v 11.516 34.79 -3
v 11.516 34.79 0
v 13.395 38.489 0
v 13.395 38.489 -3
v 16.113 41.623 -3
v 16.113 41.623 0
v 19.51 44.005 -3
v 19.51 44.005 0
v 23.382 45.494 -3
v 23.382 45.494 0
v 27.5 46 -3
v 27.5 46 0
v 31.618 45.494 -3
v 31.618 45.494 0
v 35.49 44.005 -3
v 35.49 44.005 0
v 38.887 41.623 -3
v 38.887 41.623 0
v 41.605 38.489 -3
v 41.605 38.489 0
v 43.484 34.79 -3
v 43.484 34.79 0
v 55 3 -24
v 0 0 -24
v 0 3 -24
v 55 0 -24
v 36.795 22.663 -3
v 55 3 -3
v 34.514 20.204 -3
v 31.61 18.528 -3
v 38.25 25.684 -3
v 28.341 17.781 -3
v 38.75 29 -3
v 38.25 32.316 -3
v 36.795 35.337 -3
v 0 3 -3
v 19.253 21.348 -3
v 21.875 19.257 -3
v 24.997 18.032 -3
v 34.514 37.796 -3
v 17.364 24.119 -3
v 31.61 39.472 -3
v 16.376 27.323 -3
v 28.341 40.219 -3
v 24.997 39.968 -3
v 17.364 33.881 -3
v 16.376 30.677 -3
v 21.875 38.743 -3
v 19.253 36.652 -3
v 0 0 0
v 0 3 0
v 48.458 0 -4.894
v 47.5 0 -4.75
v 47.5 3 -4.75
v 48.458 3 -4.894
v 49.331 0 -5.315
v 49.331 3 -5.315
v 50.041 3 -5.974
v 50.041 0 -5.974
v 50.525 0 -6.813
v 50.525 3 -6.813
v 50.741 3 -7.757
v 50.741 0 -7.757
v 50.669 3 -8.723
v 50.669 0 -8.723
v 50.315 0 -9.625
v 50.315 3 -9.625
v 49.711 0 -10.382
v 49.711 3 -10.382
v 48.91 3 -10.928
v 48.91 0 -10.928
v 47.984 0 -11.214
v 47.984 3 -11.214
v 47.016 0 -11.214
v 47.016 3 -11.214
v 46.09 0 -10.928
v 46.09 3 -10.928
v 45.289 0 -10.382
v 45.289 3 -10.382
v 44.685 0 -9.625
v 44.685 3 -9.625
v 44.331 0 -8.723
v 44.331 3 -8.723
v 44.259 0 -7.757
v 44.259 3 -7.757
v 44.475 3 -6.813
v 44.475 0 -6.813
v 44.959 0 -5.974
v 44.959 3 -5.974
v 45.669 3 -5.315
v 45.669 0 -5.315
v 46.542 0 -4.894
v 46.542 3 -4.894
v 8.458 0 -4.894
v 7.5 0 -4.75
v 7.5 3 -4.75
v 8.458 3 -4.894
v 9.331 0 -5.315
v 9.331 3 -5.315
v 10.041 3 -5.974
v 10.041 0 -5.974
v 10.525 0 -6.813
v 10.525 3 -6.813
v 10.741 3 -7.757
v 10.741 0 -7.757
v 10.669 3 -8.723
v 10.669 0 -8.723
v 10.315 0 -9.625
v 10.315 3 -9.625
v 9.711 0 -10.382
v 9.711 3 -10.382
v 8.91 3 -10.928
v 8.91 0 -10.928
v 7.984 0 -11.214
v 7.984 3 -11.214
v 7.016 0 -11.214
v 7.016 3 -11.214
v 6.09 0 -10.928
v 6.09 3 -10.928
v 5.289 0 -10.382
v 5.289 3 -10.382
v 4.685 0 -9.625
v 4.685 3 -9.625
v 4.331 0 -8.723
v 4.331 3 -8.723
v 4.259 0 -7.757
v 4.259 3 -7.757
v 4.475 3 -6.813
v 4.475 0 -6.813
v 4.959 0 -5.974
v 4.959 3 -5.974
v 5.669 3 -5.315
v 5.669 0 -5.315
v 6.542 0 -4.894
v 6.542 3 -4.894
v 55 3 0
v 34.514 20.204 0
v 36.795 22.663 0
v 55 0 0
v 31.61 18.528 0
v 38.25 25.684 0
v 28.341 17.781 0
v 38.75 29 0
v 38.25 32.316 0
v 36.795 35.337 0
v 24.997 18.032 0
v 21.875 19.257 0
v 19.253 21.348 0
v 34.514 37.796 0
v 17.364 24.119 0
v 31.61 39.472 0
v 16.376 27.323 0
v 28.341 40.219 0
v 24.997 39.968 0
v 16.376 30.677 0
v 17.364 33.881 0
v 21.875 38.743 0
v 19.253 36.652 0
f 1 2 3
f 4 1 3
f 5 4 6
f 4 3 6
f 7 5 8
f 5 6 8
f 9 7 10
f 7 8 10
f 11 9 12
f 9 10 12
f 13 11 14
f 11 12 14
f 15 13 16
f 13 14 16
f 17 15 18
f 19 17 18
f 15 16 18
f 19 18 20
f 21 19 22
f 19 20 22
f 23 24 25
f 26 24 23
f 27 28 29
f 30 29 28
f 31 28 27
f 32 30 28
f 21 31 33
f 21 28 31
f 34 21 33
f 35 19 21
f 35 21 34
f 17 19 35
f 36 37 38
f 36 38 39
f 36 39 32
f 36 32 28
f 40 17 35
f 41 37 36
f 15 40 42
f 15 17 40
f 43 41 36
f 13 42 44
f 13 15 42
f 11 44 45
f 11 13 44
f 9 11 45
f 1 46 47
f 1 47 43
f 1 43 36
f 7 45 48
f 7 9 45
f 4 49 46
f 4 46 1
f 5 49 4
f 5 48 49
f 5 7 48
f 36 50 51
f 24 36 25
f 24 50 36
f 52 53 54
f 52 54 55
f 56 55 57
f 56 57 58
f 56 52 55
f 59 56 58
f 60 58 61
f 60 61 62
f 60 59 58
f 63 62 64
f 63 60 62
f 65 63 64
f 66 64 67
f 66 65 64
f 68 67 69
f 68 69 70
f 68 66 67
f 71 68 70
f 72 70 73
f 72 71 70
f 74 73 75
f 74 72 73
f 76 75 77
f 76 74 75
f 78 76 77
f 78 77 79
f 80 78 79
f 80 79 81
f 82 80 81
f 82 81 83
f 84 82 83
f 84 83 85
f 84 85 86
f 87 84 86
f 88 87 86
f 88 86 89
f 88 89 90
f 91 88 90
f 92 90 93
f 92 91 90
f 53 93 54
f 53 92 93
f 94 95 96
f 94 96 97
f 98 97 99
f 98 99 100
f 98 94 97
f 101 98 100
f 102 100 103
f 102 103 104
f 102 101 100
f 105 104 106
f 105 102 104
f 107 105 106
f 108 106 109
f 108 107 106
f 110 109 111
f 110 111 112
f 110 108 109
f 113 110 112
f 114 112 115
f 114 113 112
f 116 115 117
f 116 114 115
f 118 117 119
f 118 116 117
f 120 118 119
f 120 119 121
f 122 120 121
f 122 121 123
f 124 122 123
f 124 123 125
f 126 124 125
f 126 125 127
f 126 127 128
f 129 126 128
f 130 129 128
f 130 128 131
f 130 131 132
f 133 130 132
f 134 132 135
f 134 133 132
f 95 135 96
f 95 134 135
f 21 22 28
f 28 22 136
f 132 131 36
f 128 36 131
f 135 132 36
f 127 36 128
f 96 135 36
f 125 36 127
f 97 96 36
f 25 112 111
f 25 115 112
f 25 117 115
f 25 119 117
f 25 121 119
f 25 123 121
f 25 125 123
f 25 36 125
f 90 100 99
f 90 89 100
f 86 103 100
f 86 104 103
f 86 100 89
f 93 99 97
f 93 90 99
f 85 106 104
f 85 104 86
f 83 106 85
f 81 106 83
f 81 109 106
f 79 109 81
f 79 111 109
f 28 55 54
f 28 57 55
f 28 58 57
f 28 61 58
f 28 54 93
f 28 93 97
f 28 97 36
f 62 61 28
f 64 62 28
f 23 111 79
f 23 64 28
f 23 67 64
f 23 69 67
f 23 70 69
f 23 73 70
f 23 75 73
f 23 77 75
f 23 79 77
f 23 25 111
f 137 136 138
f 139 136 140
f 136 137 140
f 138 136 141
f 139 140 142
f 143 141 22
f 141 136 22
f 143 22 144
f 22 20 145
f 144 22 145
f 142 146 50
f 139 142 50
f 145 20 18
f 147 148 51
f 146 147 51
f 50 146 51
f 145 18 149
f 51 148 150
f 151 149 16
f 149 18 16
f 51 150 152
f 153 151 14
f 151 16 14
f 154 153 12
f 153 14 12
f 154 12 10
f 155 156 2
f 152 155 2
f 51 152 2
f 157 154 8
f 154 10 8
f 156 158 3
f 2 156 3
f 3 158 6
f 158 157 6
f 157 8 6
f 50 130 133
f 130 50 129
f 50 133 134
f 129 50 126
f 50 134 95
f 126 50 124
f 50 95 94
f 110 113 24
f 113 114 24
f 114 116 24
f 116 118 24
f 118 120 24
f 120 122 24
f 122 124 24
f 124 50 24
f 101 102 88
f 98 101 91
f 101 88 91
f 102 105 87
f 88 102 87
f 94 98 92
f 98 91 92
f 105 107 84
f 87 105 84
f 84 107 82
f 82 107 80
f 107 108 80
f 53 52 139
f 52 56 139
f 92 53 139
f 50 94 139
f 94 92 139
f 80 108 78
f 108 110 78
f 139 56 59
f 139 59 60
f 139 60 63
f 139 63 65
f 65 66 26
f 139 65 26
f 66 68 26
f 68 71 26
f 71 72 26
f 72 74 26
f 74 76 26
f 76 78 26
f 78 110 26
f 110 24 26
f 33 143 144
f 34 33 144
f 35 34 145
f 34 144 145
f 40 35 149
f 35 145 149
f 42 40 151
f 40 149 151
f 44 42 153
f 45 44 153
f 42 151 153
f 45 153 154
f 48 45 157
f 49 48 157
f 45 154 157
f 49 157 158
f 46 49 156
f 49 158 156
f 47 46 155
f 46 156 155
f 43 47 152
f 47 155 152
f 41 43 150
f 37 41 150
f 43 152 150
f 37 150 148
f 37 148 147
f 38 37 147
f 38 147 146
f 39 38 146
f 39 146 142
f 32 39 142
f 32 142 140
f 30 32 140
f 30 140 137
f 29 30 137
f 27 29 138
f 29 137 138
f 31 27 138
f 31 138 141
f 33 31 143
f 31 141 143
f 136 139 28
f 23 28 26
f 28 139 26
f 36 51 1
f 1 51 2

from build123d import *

# Parameters (mm, degrees)
SKETCH_1_W      = 55
SKETCH_1_H      = 24
SKETCH_1_R      = 3.25
EXTRUDE_1_DEPTH = 3
SKETCH_3_R      = 11.25
EXTRUDE_2_DEPTH = 3


with BuildPart() as part:
    # 草图1 → 凸台-拉伸1 (new body)
    with BuildSketch(Plane(origin=(0, 0, 0), x_dir=(1, 0, 0), z_dir=(0, 1, 0))):
        with Locations((27.5, 12)):
            Rectangle(SKETCH_1_W, SKETCH_1_H)
        with Locations(Location((47.5, 8, 0), (0, 0, 270))):
            Circle(SKETCH_1_R, mode=Mode.SUBTRACT)
        with Locations(Location((7.5, 8, 0), (0, 0, 270))):
            Circle(SKETCH_1_R, mode=Mode.SUBTRACT)
    extrude(amount=EXTRUDE_1_DEPTH)

    # 草图3 → 凸台-拉伸2 (add)
    with BuildSketch(Plane.XY):
        with BuildLine():
            Line((0, 3), (11.516480911, 34.790260575))
            ThreePointArc((11.516480911, 34.790260575), (27.5, 46), (43.483519089, 34.790260575))
            Line((43.483519089, 34.790260575), (55, 3))
            Line((55, 3), (0, 3))
        make_face()
        with Locations((27.5, 29)):
            Circle(SKETCH_3_R, mode=Mode.SUBTRACT)
    extrude(amount=-EXTRUDE_2_DEPTH)


solid = part.part
